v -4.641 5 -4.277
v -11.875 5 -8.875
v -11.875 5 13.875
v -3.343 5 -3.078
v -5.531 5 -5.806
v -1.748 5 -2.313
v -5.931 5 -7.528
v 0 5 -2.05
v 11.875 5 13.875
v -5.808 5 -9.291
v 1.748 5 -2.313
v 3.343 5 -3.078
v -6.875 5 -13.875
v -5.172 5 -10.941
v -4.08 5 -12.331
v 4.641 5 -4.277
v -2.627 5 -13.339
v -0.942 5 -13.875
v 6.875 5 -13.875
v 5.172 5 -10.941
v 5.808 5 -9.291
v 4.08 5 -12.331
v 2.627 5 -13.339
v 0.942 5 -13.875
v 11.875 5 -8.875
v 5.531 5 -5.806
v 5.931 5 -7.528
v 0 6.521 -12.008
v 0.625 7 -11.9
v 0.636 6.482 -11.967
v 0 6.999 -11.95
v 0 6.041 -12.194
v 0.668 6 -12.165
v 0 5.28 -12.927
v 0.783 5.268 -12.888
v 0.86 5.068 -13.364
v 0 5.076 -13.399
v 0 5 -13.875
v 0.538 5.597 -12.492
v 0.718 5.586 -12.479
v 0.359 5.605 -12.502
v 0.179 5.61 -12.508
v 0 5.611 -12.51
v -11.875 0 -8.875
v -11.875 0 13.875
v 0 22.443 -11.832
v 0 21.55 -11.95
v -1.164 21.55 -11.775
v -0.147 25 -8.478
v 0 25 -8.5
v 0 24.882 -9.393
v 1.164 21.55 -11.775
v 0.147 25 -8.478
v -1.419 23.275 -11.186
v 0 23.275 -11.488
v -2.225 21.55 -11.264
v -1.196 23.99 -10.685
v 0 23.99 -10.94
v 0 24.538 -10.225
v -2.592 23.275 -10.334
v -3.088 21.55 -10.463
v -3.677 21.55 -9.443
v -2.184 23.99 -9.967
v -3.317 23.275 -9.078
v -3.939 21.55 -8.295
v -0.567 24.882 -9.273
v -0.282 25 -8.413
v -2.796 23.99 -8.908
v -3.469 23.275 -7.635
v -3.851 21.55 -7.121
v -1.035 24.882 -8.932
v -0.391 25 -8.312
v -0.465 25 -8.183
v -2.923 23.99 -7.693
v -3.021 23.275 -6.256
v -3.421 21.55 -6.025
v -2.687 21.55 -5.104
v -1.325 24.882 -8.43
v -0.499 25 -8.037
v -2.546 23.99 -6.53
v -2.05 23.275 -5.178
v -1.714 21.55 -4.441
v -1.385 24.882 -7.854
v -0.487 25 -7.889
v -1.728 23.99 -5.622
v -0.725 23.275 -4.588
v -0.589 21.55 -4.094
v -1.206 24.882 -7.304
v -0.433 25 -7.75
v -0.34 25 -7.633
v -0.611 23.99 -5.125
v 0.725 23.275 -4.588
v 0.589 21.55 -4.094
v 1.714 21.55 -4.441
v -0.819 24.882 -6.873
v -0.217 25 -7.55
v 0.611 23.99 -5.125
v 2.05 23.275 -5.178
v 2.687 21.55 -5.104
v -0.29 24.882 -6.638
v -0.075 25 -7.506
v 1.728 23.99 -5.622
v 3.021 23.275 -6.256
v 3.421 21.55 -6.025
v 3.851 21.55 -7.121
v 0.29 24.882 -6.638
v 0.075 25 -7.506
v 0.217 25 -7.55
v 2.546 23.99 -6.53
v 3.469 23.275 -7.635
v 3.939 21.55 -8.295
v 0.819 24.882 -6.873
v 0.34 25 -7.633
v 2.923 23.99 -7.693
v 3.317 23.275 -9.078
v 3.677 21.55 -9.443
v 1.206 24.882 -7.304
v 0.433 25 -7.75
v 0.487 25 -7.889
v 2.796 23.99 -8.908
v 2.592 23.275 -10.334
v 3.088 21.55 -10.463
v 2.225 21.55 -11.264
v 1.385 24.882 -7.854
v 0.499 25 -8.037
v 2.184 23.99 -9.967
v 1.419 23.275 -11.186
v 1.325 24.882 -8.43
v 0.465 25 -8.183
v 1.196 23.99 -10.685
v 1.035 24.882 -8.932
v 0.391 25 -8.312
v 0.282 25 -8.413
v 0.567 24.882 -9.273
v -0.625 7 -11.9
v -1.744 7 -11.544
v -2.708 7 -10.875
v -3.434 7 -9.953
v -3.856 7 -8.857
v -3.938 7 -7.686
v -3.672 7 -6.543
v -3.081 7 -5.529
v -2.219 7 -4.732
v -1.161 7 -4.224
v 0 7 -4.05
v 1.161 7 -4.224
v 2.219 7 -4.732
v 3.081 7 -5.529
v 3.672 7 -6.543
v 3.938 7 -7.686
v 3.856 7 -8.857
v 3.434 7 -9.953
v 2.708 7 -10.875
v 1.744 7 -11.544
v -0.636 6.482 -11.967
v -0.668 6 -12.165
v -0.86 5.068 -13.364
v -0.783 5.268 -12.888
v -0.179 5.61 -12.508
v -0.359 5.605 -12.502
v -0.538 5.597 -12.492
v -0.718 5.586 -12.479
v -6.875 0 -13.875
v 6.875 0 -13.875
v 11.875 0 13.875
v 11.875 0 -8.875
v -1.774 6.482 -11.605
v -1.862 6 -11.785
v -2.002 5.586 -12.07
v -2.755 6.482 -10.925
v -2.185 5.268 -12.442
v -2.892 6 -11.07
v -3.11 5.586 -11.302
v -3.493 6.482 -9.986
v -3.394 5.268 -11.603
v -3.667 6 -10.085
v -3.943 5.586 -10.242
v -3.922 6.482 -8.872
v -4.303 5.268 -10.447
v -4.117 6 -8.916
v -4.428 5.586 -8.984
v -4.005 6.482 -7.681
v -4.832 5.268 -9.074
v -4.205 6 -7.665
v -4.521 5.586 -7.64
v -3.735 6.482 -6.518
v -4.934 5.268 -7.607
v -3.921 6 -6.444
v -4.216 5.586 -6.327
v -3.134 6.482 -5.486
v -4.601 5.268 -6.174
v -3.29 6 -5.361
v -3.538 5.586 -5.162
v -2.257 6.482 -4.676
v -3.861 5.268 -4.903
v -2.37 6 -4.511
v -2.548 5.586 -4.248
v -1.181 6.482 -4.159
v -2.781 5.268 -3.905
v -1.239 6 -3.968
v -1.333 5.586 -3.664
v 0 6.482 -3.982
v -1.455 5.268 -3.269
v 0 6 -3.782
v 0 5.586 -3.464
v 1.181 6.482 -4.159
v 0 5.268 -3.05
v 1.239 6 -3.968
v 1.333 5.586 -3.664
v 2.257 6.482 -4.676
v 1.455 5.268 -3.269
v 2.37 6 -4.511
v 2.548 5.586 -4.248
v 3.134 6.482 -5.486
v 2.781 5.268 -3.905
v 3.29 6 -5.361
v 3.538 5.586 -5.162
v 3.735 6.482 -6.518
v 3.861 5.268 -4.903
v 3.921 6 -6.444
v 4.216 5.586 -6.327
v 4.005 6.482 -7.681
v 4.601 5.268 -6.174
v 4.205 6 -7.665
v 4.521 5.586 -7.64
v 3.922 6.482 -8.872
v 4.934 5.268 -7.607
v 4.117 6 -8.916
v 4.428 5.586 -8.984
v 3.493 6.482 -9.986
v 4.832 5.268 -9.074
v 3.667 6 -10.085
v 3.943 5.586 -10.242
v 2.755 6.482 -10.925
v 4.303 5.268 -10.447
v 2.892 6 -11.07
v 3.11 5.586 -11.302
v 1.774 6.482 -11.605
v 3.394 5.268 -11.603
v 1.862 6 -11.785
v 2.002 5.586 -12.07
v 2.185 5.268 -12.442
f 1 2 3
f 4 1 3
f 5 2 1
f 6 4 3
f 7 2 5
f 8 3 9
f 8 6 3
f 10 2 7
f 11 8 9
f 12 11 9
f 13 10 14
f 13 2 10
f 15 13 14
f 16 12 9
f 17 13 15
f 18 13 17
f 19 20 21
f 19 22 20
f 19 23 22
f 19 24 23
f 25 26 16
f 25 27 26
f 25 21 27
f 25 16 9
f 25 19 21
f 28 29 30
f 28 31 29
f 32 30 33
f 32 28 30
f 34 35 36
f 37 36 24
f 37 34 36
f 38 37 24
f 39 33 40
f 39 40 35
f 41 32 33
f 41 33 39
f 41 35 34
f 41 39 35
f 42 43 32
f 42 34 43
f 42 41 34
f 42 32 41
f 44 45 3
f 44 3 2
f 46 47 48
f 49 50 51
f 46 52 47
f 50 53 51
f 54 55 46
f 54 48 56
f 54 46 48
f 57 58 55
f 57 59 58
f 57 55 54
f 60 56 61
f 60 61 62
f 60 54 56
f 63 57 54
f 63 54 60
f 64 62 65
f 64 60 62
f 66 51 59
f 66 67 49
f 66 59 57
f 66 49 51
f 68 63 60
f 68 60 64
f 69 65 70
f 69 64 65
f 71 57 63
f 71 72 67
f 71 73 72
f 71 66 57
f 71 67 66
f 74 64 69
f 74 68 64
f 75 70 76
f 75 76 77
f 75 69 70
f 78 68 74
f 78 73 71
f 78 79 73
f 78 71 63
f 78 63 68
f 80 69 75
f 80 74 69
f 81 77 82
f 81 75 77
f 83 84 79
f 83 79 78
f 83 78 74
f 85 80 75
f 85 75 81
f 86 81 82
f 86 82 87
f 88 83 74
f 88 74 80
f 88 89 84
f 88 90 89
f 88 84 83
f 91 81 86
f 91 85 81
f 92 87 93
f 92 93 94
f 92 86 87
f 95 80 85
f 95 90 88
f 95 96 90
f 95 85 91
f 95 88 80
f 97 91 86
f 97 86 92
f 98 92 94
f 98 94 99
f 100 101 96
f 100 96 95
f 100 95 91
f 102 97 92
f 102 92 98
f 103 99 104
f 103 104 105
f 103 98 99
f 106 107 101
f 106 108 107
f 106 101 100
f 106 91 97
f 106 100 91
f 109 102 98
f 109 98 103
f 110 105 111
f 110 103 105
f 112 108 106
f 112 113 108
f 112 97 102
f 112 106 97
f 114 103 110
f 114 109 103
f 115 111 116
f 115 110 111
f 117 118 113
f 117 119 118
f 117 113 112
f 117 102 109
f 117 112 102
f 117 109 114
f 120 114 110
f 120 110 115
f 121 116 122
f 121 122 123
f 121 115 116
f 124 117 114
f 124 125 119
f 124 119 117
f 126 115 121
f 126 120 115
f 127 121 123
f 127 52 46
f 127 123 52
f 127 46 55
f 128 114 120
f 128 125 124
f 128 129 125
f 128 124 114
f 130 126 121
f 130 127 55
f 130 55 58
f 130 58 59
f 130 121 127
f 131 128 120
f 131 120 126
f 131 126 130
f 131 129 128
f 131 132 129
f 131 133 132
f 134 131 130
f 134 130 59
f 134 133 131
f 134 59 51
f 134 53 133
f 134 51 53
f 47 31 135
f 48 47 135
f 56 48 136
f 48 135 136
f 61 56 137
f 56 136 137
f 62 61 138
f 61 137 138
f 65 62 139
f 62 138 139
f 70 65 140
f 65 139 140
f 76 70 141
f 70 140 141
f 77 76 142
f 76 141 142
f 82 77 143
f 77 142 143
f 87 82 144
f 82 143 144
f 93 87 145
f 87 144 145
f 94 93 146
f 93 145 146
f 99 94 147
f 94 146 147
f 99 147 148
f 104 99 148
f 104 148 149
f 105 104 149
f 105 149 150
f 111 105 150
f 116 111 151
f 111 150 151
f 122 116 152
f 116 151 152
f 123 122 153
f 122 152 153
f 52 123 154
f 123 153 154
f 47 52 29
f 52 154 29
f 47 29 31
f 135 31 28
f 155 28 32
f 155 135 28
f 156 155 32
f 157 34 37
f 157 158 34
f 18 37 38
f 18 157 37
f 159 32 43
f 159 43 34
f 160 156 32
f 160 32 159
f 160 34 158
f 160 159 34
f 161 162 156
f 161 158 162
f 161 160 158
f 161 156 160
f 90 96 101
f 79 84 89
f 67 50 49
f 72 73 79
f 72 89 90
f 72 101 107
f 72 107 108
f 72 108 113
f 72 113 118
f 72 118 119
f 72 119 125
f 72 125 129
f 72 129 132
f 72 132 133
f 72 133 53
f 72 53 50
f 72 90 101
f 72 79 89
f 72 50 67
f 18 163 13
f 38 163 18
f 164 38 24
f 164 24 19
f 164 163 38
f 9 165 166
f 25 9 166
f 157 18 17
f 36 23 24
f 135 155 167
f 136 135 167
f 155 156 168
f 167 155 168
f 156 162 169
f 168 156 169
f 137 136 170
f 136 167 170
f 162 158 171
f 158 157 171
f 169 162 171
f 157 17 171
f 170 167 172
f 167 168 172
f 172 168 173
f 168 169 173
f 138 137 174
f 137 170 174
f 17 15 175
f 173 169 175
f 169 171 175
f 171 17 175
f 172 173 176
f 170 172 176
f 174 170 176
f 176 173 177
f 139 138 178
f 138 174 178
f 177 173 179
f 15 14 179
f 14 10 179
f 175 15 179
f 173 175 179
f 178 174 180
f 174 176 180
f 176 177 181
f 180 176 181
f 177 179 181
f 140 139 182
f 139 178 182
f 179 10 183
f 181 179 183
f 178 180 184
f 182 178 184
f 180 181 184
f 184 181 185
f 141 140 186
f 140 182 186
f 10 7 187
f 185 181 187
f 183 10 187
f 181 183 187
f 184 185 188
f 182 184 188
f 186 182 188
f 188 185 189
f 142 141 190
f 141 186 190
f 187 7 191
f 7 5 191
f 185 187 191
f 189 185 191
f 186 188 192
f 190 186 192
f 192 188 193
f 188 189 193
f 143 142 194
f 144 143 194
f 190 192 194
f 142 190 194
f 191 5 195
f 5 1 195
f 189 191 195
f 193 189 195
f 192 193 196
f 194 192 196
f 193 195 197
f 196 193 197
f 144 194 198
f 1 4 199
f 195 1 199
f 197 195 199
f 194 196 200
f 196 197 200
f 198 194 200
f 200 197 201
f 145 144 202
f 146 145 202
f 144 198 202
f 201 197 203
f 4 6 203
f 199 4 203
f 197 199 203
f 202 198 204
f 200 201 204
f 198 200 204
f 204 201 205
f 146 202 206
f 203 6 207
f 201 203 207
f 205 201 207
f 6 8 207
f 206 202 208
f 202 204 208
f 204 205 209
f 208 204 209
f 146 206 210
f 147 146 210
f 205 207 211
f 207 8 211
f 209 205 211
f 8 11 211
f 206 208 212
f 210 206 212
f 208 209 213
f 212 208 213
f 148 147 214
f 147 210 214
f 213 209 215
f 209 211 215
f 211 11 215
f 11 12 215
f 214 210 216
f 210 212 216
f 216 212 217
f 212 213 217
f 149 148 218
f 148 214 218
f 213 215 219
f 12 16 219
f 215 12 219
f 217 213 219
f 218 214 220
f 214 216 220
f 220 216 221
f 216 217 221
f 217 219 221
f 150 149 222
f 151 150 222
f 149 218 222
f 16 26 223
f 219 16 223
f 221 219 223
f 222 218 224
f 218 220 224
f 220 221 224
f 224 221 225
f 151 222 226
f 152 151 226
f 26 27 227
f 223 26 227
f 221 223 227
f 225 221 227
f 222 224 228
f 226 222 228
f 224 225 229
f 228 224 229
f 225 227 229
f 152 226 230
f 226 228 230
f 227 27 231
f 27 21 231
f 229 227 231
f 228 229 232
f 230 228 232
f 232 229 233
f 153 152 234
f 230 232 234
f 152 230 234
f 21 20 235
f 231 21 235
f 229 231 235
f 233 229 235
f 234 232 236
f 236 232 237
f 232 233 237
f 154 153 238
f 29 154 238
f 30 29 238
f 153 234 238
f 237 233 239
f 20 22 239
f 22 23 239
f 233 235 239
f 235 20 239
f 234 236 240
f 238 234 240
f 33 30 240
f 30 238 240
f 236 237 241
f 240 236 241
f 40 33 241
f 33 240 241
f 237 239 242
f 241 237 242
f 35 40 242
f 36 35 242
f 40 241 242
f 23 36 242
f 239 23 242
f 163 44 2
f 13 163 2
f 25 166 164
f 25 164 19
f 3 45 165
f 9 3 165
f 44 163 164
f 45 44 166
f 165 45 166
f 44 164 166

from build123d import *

# Parameters (mm, degrees)
SKETCH1_W           = 23.75
SKETCH1_H           = 27.75
BOSS_EXTRUDE1_DEPTH = 5
SKETCH2_R           = 3.95
BOSS_EXTRUDE2_DEPTH = 20
FILLET1_R           = 3.45
FILLET2_R           = 2
CHAMFER1_SIZE       = 5


with BuildPart() as part:
    # Sketch1 → Boss-Extrude1 (new body)
    with BuildSketch(Plane(origin=(0, 0, 0), x_dir=(1, 0, 0), z_dir=(0, 1, 0))):
        Rectangle(SKETCH1_W, SKETCH1_H)
    extrude(amount=BOSS_EXTRUDE1_DEPTH)

    # Sketch2 → Boss-Extrude2 (add)
    with BuildSketch(Plane(origin=(0, 5, 0), x_dir=(1, 0, 0), z_dir=(0, 1, 0))):
        with Locations(Location((0, 8, 0), (0, 0, 90))):
            Circle(SKETCH2_R)
    extrude(amount=BOSS_EXTRUDE2_DEPTH)

    # Fillet1
    fillet1_edges = [part.edges().sort_by_distance(p)[0] for p in [
        (0, 25, -4.05),
    ]]
    fillet(fillet1_edges, radius=FILLET1_R)

    # Fillet2
    fillet2_edges = [part.edges().sort_by_distance(p)[0] for p in [
        (0, 5, -4.05),
    ]]
    fillet(fillet2_edges, radius=FILLET2_R)

    # Chamfer1
    chamfer1_edges = [part.edges().sort_by_distance(p)[0] for p in [
        (-11.875, 2.5, -13.875),
        (11.875, 2.5, -13.875),
    ]]
    chamfer(chamfer1_edges, length=CHAMFER1_SIZE)


solid = part.part
